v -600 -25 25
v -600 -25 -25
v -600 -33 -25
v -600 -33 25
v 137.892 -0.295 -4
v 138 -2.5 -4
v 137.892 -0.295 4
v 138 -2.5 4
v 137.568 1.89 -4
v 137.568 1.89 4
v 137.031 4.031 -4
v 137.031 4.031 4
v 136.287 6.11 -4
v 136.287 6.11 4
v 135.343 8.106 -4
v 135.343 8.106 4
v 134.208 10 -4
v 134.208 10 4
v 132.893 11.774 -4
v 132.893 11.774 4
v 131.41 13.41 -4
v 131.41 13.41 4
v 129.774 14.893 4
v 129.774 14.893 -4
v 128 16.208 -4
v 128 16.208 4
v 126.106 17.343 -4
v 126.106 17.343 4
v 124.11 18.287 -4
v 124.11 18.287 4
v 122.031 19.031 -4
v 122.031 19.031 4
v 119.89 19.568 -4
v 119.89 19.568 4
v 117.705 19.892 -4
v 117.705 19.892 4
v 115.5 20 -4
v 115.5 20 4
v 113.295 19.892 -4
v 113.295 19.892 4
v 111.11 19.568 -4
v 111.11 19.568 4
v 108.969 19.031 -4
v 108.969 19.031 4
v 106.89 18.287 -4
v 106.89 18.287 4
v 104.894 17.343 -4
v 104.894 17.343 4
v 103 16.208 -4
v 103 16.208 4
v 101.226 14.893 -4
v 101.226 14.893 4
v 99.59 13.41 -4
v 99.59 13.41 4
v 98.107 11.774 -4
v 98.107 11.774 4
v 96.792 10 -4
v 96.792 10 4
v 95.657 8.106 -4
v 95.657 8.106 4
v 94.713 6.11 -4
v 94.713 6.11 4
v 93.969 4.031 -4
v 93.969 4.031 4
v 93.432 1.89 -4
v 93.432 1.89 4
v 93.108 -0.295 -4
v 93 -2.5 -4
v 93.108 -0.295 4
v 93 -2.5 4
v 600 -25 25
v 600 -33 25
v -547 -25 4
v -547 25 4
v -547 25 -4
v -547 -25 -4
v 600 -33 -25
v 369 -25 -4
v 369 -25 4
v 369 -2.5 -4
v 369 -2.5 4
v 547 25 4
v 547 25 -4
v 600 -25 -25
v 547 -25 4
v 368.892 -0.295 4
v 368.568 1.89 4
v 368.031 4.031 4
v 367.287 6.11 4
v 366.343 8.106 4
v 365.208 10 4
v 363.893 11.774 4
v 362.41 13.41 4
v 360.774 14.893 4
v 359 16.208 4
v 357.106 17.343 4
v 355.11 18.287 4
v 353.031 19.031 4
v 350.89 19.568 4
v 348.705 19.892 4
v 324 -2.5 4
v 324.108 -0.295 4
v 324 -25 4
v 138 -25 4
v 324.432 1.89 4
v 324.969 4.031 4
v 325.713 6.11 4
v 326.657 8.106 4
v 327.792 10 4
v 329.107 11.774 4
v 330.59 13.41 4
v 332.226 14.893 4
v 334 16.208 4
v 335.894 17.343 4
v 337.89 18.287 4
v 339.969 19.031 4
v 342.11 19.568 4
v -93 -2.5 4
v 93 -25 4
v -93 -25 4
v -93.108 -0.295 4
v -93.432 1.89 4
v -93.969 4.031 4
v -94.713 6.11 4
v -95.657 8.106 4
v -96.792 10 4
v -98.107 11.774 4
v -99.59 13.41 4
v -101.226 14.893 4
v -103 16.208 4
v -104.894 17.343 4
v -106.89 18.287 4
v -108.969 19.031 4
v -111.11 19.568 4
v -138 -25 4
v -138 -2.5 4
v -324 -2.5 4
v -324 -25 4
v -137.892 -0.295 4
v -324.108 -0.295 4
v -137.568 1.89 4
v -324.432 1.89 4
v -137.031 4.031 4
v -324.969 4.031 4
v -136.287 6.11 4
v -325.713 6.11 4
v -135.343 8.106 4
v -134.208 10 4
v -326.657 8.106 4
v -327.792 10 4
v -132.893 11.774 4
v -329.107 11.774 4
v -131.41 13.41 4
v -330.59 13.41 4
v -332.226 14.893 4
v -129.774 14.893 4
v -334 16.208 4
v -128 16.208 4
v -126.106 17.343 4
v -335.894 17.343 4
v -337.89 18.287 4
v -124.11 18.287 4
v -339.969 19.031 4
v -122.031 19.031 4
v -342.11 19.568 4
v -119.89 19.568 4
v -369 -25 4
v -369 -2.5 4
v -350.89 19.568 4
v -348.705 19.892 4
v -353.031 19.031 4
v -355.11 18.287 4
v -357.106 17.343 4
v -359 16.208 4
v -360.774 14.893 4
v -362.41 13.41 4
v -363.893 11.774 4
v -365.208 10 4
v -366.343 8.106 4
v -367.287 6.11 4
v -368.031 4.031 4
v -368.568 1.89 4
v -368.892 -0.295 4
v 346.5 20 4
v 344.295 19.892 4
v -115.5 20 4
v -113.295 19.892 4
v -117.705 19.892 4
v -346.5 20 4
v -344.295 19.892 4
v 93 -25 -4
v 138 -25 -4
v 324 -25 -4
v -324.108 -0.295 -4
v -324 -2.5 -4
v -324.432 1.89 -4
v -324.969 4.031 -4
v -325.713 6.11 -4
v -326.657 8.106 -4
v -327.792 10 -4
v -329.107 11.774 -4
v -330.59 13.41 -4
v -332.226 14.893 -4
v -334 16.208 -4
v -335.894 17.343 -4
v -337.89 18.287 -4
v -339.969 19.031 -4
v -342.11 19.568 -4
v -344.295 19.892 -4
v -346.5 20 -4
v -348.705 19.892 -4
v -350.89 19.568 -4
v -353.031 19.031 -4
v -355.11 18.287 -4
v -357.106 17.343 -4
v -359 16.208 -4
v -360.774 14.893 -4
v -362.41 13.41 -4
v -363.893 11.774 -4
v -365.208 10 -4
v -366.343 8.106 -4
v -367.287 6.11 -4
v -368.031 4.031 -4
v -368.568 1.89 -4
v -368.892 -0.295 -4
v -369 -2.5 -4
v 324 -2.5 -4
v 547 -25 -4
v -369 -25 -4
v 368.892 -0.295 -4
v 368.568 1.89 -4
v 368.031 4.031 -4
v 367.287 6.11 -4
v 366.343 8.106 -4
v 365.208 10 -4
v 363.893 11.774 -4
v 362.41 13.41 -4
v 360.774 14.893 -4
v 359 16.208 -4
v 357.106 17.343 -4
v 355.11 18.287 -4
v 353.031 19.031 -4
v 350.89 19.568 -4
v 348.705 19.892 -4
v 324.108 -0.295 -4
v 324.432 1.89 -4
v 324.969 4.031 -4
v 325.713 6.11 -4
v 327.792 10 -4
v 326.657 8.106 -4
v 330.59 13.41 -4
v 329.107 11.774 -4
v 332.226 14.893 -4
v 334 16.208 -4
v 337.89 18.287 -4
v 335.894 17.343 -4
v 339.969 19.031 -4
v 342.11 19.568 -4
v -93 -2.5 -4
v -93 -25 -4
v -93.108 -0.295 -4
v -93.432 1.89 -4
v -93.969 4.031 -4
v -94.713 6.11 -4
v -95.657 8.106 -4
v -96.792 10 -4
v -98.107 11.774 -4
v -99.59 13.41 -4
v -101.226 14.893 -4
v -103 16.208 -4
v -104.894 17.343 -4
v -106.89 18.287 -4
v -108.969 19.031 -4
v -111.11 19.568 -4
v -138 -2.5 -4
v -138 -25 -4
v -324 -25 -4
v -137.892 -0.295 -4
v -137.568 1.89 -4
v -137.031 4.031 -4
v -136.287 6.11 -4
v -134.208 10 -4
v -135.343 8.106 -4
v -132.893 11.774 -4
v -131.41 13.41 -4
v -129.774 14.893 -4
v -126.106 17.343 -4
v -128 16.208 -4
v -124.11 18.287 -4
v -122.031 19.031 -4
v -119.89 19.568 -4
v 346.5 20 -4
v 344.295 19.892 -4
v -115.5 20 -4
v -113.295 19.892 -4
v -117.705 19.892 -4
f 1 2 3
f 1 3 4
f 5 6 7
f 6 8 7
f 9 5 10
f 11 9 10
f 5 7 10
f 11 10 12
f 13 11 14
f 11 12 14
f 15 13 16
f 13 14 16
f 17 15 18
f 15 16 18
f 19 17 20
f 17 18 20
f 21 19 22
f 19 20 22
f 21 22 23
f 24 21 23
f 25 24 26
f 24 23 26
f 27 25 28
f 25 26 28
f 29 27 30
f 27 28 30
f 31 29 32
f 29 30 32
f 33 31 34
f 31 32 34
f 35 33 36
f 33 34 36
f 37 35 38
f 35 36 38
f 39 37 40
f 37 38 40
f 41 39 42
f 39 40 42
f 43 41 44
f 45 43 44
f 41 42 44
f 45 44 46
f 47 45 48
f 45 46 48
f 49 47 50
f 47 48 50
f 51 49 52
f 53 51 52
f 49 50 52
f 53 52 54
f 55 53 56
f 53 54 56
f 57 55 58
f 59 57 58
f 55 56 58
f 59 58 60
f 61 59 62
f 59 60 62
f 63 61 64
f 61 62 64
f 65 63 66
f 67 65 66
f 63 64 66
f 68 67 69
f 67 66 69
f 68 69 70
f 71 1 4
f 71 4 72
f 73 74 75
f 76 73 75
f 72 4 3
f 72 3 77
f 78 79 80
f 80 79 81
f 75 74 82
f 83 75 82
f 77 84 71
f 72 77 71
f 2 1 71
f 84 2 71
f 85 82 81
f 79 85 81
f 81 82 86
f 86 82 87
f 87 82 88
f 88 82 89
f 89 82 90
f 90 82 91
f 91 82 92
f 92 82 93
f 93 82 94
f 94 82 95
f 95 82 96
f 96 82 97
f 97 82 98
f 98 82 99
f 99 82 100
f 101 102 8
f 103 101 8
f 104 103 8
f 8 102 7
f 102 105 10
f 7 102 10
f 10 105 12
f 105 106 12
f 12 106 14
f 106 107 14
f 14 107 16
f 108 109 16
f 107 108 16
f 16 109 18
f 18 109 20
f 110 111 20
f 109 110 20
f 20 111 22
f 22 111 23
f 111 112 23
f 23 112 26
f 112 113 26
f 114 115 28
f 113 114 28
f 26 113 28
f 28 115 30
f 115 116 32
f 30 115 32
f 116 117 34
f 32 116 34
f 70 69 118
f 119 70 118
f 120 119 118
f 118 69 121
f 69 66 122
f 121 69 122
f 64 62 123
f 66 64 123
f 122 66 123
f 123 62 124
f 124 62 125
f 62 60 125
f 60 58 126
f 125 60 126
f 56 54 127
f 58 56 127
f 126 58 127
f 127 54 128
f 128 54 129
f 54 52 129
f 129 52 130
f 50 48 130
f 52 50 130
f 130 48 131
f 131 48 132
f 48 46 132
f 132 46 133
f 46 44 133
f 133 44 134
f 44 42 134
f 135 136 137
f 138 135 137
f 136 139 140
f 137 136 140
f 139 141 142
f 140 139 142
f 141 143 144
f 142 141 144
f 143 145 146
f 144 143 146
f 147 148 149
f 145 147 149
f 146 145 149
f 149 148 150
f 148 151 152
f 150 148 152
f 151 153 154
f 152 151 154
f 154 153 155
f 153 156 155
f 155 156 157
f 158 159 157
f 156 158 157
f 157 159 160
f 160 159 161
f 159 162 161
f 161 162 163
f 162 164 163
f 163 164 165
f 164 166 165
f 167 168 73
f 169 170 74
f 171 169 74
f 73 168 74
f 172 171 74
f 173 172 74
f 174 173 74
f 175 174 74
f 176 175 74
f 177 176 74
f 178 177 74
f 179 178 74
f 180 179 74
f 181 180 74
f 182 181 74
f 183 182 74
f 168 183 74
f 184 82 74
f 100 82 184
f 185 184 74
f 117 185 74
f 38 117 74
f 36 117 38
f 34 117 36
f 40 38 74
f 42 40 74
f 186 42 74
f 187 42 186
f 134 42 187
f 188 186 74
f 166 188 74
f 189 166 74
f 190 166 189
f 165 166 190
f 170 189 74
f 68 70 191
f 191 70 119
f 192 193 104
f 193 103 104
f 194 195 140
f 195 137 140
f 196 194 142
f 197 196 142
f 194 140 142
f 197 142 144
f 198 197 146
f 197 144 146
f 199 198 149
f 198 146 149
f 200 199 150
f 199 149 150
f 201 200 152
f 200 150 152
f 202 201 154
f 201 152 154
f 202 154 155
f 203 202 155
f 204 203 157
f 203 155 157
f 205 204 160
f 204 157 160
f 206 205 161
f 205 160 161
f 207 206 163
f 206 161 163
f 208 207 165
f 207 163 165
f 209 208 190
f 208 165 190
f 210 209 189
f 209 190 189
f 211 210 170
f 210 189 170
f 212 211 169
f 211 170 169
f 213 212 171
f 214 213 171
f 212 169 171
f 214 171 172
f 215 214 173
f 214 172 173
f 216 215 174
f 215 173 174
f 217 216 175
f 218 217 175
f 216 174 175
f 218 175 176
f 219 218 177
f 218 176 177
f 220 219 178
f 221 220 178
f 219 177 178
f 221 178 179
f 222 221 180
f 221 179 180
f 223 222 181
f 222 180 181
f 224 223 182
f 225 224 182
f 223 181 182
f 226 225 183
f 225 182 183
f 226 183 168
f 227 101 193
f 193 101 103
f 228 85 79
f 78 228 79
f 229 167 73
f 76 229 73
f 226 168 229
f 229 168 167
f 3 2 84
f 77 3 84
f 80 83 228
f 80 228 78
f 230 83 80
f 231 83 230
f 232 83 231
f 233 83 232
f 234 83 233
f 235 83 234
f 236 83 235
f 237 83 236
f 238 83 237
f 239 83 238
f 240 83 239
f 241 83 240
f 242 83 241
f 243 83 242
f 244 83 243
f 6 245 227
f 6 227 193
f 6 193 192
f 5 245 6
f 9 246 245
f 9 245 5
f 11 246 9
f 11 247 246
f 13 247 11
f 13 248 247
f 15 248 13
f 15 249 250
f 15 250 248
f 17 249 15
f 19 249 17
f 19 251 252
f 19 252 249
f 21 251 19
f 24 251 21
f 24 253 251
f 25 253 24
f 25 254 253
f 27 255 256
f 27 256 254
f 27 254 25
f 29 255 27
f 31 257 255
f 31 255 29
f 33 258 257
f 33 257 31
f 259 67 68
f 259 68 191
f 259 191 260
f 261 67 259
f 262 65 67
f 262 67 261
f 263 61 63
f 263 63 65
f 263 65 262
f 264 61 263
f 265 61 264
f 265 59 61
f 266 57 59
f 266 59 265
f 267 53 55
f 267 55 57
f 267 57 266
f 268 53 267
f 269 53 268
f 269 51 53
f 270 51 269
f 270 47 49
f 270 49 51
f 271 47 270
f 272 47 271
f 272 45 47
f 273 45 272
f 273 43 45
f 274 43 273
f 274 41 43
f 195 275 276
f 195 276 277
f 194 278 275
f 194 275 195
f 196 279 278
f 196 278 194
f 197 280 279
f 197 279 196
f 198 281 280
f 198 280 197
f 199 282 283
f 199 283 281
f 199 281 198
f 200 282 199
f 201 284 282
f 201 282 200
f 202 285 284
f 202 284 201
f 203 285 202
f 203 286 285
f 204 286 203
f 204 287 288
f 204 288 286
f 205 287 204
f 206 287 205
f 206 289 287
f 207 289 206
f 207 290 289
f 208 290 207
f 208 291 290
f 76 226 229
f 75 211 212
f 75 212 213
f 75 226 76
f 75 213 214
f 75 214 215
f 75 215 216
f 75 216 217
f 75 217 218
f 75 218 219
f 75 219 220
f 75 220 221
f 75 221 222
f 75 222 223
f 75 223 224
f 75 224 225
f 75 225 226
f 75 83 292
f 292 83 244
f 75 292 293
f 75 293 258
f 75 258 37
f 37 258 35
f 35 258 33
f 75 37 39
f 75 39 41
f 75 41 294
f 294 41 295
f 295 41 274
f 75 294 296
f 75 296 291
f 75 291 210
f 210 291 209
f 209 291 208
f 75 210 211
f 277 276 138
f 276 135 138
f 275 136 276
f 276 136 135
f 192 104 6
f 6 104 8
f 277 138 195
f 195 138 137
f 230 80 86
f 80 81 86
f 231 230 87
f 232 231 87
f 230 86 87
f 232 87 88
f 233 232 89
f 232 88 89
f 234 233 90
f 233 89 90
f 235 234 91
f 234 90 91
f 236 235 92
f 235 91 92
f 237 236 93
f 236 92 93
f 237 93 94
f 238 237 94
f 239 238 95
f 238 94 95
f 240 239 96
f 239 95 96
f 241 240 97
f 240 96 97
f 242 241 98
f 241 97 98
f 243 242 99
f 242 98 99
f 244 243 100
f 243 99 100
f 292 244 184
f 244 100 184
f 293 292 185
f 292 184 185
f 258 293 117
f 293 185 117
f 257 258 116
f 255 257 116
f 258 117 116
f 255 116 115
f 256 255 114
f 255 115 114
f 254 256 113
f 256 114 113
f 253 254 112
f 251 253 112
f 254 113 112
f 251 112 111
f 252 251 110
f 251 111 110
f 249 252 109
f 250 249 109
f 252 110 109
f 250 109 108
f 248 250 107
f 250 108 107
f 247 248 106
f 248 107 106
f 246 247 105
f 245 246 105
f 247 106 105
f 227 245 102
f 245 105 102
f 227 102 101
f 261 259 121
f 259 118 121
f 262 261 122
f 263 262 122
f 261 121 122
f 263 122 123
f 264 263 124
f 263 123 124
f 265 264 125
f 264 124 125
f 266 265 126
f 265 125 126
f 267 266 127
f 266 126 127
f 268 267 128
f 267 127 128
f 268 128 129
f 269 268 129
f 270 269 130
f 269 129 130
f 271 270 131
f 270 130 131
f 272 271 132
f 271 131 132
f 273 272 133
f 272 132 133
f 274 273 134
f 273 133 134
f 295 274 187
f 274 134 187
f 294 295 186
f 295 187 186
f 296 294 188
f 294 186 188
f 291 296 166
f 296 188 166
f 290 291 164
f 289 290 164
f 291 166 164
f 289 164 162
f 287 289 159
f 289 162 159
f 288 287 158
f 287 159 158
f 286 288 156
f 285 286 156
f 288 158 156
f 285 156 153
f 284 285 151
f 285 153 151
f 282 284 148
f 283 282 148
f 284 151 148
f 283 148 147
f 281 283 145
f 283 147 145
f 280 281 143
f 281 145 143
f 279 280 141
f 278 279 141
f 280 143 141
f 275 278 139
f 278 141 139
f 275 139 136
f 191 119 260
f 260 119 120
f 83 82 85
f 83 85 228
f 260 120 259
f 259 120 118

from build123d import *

# Parameters (mm, degrees)
EXTRUDE_1_DEPTH      = 4
SKETCH_3_OUTSIDE_W   = 1454.212
SKETCH_3_OUTSIDE_H   = 252.212
SKETCH_3_OUTSIDE_W_2 = 1094
SKETCH_3_OUTSIDE_H_2 = 8
CUT_EXTRUDE_1_DEPTH  = 608.075777807
SKETCH_2_W           = 1200
SKETCH_2_H           = 50
EXTRUDE_2_DEPTH      = 8


with BuildPart() as part:
    # Эскиз1 → Бобышка-Вытянуть1 (new, symmetric)
    with BuildSketch(Plane.XY):
        with BuildLine():
            Line((-600, -2.5), (-600, -25))
            Line((-600, -25), (-605, -25))
            Line((-605, -25), (-605, 25))
            Line((-605, 25), (605, 25))
            Line((605, 25), (605, -25))
            Line((605, -25), (600, -25))
            Line((600, -25), (600, -2.5))
            ThreePointArc((600, -2.5), (577.5, 20), (555, -2.5))
            Line((555, -2.5), (555, -25))
            Line((555, -25), (369, -25))
            Line((369, -25), (369, -2.5))
            ThreePointArc((369, -2.5), (346.5, 20), (324, -2.5))
            Line((324, -2.5), (324, -25))
            Line((324, -25), (138, -25))
            Line((138, -25), (138, -2.5))
            ThreePointArc((138, -2.5), (115.5, 20), (93, -2.5))
            Line((93, -2.5), (93, -25))
            Line((93, -25), (-93, -25))
            Line((-93, -25), (-93, -2.5))
            ThreePointArc((-93, -2.5), (-115.5, 20), (-138, -2.5))
            Line((-138, -2.5), (-138, -25))
            Line((-138, -25), (-324, -25))
            Line((-324, -25), (-324, -2.5))
            ThreePointArc((-324, -2.5), (-346.5, 20), (-369, -2.5))
            Line((-369, -2.5), (-369, -25))
            Line((-369, -25), (-555, -25))
            Line((-555, -25), (-555, -2.5))
            ThreePointArc((-555, -2.5), (-577.5, 20), (-600, -2.5))
        make_face()
    extrude(amount=EXTRUDE_1_DEPTH, both=True)

    # Эскиз3 outside → Вырез-Вытянуть1 (cut, through all)
    with BuildSketch(Plane(origin=(0, 25, 0), x_dir=(1, 0, 0), z_dir=(0, 1, 0))):
        Rectangle(SKETCH_3_OUTSIDE_W, SKETCH_3_OUTSIDE_H)
        Rectangle(SKETCH_3_OUTSIDE_W_2, SKETCH_3_OUTSIDE_H_2, mode=Mode.SUBTRACT)
    extrude(amount=-CUT_EXTRUDE_1_DEPTH, mode=Mode.SUBTRACT)


with BuildPart() as body_2:
    # Эскиз2 → Бобышка-Вытянуть2 (new body)
    with BuildSketch(Plane.XZ.offset(25)):
        Rectangle(SKETCH_2_W, SKETCH_2_H)
    extrude(amount=EXTRUDE_2_DEPTH)


solid = Compound([part.part, body_2.part])
